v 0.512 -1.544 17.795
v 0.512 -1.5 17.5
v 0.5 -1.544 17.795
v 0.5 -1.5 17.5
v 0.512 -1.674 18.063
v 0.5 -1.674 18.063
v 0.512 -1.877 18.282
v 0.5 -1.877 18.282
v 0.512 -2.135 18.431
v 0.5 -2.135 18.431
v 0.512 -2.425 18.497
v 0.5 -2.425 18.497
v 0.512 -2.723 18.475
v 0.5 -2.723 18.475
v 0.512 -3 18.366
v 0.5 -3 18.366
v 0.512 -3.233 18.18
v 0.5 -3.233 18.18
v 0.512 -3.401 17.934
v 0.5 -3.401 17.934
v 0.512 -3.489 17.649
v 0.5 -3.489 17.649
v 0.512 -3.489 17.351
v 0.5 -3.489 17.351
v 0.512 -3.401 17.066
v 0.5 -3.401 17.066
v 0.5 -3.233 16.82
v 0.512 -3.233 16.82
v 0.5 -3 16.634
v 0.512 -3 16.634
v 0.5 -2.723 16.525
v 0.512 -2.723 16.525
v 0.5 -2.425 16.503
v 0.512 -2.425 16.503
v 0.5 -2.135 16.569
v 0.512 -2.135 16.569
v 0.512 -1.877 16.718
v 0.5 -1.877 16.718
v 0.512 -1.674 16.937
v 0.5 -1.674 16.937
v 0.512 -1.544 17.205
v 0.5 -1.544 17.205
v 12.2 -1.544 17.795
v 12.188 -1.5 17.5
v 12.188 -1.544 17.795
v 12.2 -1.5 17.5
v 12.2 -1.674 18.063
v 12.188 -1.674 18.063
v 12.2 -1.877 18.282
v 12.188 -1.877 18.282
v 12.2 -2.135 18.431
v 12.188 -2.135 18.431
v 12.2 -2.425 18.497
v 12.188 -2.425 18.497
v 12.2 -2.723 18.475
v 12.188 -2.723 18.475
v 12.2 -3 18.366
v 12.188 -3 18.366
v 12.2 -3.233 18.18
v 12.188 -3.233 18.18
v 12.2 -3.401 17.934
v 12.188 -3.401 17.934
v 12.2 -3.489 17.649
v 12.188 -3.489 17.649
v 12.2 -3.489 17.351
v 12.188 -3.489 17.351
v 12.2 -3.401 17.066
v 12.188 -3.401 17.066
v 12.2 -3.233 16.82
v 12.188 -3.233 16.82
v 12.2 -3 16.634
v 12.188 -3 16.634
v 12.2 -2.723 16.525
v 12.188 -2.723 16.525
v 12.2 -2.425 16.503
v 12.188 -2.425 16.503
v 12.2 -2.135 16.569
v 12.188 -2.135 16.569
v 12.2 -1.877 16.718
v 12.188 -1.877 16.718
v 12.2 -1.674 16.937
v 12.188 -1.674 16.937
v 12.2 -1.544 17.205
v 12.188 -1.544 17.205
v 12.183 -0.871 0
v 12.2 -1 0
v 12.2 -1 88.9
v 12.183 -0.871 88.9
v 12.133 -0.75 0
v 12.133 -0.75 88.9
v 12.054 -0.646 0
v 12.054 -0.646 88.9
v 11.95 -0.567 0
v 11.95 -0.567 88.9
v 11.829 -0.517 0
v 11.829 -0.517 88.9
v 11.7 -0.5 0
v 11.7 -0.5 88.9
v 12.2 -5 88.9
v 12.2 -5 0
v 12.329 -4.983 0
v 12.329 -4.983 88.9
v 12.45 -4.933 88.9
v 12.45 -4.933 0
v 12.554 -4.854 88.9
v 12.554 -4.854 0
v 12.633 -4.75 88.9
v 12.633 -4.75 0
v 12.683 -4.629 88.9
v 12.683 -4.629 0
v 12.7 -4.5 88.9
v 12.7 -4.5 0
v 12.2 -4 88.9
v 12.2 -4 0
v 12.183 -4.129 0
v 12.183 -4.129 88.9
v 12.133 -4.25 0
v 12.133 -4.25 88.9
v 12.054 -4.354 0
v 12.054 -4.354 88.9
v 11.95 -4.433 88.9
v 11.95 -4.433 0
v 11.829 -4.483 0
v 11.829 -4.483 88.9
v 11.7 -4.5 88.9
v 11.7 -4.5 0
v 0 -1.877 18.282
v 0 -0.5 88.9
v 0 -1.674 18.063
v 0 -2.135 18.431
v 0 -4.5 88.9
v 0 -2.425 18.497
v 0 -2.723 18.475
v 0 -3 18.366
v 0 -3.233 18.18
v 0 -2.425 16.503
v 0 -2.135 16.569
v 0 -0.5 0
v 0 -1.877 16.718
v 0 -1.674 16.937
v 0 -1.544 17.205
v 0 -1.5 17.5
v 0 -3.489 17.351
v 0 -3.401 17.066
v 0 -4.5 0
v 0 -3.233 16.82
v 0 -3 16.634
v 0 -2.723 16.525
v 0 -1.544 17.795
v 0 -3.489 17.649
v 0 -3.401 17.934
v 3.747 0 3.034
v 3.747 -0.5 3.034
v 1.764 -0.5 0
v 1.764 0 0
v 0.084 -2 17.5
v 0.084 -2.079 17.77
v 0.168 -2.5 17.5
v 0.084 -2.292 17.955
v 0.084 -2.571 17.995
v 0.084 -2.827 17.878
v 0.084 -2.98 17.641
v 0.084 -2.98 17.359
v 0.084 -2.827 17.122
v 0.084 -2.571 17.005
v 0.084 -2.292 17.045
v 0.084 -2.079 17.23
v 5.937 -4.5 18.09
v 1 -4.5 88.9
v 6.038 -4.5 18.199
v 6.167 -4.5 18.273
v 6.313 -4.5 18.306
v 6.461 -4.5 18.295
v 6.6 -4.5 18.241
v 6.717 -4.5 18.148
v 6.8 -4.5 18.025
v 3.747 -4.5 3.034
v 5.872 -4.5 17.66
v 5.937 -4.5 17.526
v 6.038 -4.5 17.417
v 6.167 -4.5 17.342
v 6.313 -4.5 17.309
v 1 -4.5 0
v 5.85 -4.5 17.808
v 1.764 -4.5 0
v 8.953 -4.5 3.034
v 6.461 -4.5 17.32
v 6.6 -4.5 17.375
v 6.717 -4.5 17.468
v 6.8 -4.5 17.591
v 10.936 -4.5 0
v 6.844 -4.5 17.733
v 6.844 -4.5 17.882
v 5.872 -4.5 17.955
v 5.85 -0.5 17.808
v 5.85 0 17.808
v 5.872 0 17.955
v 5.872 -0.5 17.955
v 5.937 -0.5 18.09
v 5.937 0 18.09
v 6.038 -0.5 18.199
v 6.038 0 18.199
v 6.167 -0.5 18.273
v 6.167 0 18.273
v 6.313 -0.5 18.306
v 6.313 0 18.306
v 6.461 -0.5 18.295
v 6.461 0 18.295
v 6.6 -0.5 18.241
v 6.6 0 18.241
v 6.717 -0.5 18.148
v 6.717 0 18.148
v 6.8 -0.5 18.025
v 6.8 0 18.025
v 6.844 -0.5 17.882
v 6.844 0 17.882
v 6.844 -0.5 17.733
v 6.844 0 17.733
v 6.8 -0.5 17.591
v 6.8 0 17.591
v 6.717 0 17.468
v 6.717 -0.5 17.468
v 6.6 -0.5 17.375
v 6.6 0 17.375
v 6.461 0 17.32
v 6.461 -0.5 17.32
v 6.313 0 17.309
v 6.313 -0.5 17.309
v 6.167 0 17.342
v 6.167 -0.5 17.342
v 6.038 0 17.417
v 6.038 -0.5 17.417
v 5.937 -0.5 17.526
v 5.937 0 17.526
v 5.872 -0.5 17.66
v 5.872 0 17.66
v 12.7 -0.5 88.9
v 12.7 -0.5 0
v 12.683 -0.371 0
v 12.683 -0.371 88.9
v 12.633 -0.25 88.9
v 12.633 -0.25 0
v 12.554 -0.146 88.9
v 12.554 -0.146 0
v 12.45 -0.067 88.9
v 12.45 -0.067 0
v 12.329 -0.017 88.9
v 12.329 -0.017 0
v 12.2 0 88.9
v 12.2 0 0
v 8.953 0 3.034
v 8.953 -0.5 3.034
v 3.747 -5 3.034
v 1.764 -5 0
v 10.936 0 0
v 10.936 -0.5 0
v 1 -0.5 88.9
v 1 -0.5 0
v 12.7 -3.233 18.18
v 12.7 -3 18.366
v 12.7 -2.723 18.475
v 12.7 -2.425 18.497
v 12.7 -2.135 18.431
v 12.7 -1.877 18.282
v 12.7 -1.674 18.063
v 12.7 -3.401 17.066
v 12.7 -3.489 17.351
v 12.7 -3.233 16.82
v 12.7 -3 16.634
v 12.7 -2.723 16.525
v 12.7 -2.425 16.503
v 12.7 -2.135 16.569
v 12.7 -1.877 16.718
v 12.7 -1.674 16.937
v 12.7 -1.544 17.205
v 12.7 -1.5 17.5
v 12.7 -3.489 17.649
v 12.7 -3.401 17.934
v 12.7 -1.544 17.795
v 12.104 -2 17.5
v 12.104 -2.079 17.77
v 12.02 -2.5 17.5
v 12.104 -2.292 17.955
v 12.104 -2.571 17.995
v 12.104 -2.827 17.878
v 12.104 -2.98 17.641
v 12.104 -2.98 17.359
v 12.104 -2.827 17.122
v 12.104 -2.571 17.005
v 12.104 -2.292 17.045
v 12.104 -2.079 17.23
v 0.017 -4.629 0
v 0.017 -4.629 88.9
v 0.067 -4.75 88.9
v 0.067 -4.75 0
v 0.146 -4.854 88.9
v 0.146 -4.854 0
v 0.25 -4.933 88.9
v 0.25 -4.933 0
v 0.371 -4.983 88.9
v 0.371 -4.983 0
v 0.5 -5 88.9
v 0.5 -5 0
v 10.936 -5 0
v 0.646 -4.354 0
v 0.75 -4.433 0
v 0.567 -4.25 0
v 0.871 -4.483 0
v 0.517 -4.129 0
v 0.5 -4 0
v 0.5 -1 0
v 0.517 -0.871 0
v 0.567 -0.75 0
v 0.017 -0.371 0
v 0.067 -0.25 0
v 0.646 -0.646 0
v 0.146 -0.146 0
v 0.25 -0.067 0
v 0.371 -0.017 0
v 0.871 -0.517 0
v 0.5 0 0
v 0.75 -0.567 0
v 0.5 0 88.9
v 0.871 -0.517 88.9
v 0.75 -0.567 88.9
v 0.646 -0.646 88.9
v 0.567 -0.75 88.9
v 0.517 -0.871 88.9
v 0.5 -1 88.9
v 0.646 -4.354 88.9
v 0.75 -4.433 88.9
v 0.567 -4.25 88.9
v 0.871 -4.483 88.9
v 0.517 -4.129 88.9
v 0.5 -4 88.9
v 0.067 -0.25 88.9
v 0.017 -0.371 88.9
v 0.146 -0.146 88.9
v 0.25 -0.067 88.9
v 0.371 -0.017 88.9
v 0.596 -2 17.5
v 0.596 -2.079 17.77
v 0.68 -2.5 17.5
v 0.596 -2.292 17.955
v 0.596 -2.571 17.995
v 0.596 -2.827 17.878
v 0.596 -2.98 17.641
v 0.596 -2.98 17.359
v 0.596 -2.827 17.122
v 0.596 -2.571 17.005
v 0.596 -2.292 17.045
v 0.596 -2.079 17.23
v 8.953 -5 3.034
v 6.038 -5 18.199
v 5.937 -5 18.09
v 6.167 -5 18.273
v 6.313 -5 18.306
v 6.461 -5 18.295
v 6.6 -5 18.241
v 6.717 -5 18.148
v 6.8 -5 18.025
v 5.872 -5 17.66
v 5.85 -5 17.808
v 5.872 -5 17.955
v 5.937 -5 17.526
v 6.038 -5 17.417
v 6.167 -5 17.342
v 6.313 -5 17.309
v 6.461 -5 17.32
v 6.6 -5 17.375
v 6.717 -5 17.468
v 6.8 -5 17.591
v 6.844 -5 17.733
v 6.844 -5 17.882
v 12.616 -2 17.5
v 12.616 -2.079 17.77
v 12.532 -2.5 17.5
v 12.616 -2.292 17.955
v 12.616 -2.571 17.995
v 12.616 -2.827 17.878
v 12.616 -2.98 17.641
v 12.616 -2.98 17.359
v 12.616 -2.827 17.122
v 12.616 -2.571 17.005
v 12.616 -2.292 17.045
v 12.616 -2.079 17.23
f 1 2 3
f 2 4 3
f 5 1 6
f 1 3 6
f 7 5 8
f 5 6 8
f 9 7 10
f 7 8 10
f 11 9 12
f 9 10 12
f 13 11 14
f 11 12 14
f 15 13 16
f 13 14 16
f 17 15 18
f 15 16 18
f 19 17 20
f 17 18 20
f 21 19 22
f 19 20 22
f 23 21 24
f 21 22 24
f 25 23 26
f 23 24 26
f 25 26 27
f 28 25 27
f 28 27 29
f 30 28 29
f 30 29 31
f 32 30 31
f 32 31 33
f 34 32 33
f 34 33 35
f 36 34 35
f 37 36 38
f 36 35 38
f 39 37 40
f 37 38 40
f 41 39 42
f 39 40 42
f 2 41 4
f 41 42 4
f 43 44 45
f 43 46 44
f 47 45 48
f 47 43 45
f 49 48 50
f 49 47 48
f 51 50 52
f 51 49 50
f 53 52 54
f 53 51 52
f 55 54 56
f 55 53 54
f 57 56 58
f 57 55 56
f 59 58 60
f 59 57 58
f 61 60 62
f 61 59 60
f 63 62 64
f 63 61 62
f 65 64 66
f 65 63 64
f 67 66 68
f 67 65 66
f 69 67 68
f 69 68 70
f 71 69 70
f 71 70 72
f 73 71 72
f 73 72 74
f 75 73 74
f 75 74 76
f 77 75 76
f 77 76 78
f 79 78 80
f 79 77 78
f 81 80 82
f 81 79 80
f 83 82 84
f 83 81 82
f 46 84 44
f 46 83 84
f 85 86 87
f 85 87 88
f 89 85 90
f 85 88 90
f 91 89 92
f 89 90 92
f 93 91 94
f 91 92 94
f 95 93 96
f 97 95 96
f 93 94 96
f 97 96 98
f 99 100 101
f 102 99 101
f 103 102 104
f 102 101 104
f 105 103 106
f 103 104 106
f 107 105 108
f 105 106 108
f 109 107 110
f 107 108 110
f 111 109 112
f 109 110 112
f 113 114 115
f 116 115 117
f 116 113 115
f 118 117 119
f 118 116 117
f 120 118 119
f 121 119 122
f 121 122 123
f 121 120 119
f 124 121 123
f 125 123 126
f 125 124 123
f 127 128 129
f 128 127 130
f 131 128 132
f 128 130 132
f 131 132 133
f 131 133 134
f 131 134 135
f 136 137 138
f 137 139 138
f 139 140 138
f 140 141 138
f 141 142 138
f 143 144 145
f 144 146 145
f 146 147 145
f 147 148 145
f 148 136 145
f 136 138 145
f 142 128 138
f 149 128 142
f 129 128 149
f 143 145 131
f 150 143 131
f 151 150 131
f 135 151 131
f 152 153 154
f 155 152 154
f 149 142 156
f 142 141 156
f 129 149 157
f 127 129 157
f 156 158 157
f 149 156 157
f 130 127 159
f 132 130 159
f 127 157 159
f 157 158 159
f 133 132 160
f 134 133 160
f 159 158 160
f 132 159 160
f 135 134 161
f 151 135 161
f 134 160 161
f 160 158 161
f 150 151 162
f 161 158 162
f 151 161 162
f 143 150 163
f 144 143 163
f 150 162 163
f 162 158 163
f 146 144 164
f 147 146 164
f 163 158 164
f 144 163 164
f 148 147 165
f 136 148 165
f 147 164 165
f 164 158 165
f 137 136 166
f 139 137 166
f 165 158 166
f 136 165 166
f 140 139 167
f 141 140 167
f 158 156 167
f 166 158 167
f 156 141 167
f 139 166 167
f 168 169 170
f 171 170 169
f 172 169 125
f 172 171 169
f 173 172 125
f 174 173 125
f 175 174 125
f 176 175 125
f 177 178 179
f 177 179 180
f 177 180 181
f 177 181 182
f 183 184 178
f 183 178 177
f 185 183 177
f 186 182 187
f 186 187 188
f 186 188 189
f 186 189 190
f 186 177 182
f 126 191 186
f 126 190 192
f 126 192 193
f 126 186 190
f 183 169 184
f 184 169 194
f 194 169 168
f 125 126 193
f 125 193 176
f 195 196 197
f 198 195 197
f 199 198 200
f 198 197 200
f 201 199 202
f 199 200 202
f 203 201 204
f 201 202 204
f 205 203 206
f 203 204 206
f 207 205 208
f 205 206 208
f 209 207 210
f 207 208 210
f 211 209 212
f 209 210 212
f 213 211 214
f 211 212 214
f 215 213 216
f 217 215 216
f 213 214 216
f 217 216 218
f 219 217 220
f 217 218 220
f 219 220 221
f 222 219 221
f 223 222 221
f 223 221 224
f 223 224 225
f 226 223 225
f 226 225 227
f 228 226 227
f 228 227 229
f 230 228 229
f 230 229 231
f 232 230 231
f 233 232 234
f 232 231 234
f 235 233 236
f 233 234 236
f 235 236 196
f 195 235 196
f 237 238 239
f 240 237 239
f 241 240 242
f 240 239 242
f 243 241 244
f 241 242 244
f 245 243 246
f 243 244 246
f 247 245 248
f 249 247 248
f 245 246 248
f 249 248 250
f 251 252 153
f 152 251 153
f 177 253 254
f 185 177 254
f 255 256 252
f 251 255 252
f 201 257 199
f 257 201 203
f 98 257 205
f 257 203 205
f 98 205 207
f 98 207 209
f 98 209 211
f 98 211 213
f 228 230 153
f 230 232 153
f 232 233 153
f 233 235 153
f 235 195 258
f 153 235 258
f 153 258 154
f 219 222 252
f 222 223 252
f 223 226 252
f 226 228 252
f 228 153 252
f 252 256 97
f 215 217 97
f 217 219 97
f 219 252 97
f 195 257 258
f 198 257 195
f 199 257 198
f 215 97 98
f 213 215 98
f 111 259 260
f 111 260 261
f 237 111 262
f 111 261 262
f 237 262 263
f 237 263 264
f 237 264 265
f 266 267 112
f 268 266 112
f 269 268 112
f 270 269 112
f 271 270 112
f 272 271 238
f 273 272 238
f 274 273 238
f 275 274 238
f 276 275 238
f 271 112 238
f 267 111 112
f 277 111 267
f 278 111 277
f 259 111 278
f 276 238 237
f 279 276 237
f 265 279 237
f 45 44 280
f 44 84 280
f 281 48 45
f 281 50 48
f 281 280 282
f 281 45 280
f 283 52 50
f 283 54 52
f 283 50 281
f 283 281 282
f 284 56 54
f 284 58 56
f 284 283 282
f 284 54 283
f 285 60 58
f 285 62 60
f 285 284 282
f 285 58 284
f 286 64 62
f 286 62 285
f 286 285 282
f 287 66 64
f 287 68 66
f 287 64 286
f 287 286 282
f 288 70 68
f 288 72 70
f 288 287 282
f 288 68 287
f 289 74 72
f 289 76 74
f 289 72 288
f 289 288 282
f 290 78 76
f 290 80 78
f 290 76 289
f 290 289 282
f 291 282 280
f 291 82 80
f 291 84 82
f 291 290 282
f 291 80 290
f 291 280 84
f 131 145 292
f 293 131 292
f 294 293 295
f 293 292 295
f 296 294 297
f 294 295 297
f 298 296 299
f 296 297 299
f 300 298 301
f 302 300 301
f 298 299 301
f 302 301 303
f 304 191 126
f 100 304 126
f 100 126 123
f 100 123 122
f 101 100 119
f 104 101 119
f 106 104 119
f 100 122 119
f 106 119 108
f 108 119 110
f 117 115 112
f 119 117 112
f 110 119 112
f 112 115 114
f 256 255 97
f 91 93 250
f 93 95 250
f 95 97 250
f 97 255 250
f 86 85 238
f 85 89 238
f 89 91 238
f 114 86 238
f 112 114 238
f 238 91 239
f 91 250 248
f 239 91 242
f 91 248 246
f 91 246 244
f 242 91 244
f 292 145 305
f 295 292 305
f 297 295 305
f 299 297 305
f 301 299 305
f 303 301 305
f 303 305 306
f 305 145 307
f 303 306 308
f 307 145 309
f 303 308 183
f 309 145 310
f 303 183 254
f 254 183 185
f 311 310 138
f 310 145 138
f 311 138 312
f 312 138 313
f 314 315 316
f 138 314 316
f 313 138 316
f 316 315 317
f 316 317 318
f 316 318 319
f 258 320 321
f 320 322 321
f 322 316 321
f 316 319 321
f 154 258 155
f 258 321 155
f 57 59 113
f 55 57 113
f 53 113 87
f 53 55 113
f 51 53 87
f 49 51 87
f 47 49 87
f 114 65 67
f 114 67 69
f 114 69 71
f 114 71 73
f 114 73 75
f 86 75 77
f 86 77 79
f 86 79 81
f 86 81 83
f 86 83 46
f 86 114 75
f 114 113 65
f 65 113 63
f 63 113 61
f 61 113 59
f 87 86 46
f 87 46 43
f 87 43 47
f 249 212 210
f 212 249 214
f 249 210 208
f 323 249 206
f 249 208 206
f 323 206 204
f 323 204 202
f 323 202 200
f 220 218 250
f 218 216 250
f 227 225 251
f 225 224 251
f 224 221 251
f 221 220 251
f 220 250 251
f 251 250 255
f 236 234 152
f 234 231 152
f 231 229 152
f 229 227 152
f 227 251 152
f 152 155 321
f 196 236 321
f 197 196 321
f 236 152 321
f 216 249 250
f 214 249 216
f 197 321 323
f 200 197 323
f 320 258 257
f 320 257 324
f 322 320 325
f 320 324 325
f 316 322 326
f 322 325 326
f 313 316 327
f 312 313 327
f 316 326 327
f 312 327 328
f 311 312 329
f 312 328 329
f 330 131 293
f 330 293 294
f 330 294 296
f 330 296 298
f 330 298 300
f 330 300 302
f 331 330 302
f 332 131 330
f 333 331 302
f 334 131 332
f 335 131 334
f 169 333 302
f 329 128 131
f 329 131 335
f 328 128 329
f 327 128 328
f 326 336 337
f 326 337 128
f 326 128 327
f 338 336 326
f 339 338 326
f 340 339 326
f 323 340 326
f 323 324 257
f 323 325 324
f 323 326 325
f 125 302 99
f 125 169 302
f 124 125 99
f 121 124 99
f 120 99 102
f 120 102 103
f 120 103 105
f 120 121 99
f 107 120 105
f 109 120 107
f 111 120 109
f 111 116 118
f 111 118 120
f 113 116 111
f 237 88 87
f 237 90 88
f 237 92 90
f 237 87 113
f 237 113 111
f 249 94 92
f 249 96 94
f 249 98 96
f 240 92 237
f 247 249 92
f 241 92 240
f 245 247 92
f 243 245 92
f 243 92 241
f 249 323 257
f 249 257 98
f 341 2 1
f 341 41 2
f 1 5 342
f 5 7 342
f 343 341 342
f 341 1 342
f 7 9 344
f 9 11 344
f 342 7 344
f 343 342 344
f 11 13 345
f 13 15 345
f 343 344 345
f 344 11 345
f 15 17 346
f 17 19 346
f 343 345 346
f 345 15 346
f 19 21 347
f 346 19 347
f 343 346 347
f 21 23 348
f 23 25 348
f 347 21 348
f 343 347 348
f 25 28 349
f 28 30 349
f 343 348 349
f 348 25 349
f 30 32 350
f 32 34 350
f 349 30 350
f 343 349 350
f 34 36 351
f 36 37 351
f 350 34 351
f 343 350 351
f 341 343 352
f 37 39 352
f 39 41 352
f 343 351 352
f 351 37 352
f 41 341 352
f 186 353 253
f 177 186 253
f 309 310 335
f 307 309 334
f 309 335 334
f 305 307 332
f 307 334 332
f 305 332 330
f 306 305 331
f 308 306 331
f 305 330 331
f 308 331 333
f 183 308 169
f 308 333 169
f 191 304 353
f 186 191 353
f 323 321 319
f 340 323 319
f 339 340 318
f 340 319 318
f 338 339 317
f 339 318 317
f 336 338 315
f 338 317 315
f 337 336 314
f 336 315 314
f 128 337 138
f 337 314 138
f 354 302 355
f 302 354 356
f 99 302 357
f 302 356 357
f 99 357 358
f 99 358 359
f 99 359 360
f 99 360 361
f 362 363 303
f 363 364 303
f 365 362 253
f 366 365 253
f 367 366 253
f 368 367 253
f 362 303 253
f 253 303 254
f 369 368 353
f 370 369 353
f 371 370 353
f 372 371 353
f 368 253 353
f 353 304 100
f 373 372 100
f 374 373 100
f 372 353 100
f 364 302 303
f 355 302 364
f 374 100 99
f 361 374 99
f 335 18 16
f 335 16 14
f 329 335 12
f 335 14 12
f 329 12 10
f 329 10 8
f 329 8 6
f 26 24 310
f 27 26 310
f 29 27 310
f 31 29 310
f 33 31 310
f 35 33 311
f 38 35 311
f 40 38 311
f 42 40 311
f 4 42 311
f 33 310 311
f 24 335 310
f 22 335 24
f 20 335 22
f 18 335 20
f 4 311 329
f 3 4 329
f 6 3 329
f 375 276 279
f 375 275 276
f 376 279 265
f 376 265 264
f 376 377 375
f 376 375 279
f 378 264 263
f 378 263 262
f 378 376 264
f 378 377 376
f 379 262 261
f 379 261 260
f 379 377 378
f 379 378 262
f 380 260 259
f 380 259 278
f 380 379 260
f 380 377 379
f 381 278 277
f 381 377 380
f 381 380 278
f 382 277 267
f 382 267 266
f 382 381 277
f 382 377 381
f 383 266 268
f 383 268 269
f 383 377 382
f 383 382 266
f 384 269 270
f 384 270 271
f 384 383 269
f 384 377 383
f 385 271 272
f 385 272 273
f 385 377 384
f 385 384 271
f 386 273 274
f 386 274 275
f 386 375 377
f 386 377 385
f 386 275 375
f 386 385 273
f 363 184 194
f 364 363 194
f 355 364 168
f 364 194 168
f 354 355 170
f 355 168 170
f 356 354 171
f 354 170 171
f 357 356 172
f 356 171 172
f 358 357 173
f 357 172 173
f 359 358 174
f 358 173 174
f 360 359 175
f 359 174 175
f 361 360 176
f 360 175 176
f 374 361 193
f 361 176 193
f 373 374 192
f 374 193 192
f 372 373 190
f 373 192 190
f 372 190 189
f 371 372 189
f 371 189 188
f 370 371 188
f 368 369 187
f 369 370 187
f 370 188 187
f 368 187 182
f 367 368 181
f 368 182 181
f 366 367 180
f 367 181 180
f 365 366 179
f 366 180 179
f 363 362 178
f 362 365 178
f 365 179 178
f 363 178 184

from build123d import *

# Parameters (mm, degrees)
F0_W     = 11.7
F0_H     = 4
F1_DEPTH = 88.9
F3_DEPTH = 25
F4_R     = 0.5
F5_DEPTH = 25
F6_R     = 1
F7_DEPTH = 12.701
F13_R    = 0.5


with BuildPart() as f1:
    # F0 (on Top) → F1 (new body)
    with BuildSketch(Plane.XY):
        with BuildLine():
            Line((12.2, 0), (0.5, 0))
            ThreePointArc((0.5, 0), (0.1464466094, -0.1464466094), (0, -0.5))
            Line((0, -0.5), (0, -4.5))
            ThreePointArc((0, -4.5), (0.1464466094, -4.8535533906), (0.5, -5))
            Line((0.5, -5), (12.2, -5))
            ThreePointArc((12.2, -5), (12.5535533906, -4.8535533906), (12.7, -4.5))
            Line((12.7, -4.5), (12.7, -0.5))
            ThreePointArc((12.7, -0.5), (12.5535533906, -0.1464466094), (12.2, 0))
        make_face()
        with Locations((6.35, -2.5)):
            Rectangle(F0_W, F0_H, mode=Mode.SUBTRACT)
    extrude(amount=F1_DEPTH)

    # F2 (on face) → F3 (cut)
    with BuildSketch(Plane.XZ.offset(5)):
        Polygon((3.7468838188, 3.0342543032), (1.7641486272, 0), (10.9358513728, 0), (8.9531161812, 3.0342543032), (6.35, 3.0342543032), align=None)
    extrude(amount=-F3_DEPTH, mode=Mode.SUBTRACT)

    # F4 (on face) → F5 (cut)
    with BuildSketch(Plane(origin=(0, 0, 0), x_dir=(-1, 0, 0), z_dir=(0, 1, 0))):
        with Locations((-6.35, 17.8078599274)):
            Circle(F4_R)
    extrude(amount=-F5_DEPTH, mode=Mode.SUBTRACT)

    # F6 (on face) → F7 (cut, through all)
    with BuildSketch(Plane.YZ.offset(12.7)):
        with Locations((-2.5, 17.5)):
            Circle(F6_R)
    extrude(amount=-F7_DEPTH, mode=Mode.SUBTRACT)

    # F9 (on offset) → F10 (revolve)
    with BuildSketch(Plane.XY.offset(17.5)):
        Polygon((0.5120678688, -1.5), (0, -1.5), (0.1683332375, -2.5), (0.6804011064, -2.5), align=None)
    revolve(axis=Axis((0.6804011064, -2.5, 17.5), (1, 0, 0)))

    # F12: F1 across plane


with BuildPart() as f1_1:
    add(f1.part)
    add(f1.part.mirror(Plane(origin=(6.35, -2.5, 44.6902153566), x_dir=(0, 1, 0), z_dir=(1, 0, 0))))

    # F13
    f13_edges = [f1_1.edges().sort_by_distance(p)[0] for p in [
        (12.2, -4.5, 44.45),
        (0.5, -4.5, 44.45),
        (0.5, -0.5, 44.45),
        (12.2, -0.5, 44.45),
    ]]
    fillet(f13_edges, radius=F13_R)


solid = f1_1.part
